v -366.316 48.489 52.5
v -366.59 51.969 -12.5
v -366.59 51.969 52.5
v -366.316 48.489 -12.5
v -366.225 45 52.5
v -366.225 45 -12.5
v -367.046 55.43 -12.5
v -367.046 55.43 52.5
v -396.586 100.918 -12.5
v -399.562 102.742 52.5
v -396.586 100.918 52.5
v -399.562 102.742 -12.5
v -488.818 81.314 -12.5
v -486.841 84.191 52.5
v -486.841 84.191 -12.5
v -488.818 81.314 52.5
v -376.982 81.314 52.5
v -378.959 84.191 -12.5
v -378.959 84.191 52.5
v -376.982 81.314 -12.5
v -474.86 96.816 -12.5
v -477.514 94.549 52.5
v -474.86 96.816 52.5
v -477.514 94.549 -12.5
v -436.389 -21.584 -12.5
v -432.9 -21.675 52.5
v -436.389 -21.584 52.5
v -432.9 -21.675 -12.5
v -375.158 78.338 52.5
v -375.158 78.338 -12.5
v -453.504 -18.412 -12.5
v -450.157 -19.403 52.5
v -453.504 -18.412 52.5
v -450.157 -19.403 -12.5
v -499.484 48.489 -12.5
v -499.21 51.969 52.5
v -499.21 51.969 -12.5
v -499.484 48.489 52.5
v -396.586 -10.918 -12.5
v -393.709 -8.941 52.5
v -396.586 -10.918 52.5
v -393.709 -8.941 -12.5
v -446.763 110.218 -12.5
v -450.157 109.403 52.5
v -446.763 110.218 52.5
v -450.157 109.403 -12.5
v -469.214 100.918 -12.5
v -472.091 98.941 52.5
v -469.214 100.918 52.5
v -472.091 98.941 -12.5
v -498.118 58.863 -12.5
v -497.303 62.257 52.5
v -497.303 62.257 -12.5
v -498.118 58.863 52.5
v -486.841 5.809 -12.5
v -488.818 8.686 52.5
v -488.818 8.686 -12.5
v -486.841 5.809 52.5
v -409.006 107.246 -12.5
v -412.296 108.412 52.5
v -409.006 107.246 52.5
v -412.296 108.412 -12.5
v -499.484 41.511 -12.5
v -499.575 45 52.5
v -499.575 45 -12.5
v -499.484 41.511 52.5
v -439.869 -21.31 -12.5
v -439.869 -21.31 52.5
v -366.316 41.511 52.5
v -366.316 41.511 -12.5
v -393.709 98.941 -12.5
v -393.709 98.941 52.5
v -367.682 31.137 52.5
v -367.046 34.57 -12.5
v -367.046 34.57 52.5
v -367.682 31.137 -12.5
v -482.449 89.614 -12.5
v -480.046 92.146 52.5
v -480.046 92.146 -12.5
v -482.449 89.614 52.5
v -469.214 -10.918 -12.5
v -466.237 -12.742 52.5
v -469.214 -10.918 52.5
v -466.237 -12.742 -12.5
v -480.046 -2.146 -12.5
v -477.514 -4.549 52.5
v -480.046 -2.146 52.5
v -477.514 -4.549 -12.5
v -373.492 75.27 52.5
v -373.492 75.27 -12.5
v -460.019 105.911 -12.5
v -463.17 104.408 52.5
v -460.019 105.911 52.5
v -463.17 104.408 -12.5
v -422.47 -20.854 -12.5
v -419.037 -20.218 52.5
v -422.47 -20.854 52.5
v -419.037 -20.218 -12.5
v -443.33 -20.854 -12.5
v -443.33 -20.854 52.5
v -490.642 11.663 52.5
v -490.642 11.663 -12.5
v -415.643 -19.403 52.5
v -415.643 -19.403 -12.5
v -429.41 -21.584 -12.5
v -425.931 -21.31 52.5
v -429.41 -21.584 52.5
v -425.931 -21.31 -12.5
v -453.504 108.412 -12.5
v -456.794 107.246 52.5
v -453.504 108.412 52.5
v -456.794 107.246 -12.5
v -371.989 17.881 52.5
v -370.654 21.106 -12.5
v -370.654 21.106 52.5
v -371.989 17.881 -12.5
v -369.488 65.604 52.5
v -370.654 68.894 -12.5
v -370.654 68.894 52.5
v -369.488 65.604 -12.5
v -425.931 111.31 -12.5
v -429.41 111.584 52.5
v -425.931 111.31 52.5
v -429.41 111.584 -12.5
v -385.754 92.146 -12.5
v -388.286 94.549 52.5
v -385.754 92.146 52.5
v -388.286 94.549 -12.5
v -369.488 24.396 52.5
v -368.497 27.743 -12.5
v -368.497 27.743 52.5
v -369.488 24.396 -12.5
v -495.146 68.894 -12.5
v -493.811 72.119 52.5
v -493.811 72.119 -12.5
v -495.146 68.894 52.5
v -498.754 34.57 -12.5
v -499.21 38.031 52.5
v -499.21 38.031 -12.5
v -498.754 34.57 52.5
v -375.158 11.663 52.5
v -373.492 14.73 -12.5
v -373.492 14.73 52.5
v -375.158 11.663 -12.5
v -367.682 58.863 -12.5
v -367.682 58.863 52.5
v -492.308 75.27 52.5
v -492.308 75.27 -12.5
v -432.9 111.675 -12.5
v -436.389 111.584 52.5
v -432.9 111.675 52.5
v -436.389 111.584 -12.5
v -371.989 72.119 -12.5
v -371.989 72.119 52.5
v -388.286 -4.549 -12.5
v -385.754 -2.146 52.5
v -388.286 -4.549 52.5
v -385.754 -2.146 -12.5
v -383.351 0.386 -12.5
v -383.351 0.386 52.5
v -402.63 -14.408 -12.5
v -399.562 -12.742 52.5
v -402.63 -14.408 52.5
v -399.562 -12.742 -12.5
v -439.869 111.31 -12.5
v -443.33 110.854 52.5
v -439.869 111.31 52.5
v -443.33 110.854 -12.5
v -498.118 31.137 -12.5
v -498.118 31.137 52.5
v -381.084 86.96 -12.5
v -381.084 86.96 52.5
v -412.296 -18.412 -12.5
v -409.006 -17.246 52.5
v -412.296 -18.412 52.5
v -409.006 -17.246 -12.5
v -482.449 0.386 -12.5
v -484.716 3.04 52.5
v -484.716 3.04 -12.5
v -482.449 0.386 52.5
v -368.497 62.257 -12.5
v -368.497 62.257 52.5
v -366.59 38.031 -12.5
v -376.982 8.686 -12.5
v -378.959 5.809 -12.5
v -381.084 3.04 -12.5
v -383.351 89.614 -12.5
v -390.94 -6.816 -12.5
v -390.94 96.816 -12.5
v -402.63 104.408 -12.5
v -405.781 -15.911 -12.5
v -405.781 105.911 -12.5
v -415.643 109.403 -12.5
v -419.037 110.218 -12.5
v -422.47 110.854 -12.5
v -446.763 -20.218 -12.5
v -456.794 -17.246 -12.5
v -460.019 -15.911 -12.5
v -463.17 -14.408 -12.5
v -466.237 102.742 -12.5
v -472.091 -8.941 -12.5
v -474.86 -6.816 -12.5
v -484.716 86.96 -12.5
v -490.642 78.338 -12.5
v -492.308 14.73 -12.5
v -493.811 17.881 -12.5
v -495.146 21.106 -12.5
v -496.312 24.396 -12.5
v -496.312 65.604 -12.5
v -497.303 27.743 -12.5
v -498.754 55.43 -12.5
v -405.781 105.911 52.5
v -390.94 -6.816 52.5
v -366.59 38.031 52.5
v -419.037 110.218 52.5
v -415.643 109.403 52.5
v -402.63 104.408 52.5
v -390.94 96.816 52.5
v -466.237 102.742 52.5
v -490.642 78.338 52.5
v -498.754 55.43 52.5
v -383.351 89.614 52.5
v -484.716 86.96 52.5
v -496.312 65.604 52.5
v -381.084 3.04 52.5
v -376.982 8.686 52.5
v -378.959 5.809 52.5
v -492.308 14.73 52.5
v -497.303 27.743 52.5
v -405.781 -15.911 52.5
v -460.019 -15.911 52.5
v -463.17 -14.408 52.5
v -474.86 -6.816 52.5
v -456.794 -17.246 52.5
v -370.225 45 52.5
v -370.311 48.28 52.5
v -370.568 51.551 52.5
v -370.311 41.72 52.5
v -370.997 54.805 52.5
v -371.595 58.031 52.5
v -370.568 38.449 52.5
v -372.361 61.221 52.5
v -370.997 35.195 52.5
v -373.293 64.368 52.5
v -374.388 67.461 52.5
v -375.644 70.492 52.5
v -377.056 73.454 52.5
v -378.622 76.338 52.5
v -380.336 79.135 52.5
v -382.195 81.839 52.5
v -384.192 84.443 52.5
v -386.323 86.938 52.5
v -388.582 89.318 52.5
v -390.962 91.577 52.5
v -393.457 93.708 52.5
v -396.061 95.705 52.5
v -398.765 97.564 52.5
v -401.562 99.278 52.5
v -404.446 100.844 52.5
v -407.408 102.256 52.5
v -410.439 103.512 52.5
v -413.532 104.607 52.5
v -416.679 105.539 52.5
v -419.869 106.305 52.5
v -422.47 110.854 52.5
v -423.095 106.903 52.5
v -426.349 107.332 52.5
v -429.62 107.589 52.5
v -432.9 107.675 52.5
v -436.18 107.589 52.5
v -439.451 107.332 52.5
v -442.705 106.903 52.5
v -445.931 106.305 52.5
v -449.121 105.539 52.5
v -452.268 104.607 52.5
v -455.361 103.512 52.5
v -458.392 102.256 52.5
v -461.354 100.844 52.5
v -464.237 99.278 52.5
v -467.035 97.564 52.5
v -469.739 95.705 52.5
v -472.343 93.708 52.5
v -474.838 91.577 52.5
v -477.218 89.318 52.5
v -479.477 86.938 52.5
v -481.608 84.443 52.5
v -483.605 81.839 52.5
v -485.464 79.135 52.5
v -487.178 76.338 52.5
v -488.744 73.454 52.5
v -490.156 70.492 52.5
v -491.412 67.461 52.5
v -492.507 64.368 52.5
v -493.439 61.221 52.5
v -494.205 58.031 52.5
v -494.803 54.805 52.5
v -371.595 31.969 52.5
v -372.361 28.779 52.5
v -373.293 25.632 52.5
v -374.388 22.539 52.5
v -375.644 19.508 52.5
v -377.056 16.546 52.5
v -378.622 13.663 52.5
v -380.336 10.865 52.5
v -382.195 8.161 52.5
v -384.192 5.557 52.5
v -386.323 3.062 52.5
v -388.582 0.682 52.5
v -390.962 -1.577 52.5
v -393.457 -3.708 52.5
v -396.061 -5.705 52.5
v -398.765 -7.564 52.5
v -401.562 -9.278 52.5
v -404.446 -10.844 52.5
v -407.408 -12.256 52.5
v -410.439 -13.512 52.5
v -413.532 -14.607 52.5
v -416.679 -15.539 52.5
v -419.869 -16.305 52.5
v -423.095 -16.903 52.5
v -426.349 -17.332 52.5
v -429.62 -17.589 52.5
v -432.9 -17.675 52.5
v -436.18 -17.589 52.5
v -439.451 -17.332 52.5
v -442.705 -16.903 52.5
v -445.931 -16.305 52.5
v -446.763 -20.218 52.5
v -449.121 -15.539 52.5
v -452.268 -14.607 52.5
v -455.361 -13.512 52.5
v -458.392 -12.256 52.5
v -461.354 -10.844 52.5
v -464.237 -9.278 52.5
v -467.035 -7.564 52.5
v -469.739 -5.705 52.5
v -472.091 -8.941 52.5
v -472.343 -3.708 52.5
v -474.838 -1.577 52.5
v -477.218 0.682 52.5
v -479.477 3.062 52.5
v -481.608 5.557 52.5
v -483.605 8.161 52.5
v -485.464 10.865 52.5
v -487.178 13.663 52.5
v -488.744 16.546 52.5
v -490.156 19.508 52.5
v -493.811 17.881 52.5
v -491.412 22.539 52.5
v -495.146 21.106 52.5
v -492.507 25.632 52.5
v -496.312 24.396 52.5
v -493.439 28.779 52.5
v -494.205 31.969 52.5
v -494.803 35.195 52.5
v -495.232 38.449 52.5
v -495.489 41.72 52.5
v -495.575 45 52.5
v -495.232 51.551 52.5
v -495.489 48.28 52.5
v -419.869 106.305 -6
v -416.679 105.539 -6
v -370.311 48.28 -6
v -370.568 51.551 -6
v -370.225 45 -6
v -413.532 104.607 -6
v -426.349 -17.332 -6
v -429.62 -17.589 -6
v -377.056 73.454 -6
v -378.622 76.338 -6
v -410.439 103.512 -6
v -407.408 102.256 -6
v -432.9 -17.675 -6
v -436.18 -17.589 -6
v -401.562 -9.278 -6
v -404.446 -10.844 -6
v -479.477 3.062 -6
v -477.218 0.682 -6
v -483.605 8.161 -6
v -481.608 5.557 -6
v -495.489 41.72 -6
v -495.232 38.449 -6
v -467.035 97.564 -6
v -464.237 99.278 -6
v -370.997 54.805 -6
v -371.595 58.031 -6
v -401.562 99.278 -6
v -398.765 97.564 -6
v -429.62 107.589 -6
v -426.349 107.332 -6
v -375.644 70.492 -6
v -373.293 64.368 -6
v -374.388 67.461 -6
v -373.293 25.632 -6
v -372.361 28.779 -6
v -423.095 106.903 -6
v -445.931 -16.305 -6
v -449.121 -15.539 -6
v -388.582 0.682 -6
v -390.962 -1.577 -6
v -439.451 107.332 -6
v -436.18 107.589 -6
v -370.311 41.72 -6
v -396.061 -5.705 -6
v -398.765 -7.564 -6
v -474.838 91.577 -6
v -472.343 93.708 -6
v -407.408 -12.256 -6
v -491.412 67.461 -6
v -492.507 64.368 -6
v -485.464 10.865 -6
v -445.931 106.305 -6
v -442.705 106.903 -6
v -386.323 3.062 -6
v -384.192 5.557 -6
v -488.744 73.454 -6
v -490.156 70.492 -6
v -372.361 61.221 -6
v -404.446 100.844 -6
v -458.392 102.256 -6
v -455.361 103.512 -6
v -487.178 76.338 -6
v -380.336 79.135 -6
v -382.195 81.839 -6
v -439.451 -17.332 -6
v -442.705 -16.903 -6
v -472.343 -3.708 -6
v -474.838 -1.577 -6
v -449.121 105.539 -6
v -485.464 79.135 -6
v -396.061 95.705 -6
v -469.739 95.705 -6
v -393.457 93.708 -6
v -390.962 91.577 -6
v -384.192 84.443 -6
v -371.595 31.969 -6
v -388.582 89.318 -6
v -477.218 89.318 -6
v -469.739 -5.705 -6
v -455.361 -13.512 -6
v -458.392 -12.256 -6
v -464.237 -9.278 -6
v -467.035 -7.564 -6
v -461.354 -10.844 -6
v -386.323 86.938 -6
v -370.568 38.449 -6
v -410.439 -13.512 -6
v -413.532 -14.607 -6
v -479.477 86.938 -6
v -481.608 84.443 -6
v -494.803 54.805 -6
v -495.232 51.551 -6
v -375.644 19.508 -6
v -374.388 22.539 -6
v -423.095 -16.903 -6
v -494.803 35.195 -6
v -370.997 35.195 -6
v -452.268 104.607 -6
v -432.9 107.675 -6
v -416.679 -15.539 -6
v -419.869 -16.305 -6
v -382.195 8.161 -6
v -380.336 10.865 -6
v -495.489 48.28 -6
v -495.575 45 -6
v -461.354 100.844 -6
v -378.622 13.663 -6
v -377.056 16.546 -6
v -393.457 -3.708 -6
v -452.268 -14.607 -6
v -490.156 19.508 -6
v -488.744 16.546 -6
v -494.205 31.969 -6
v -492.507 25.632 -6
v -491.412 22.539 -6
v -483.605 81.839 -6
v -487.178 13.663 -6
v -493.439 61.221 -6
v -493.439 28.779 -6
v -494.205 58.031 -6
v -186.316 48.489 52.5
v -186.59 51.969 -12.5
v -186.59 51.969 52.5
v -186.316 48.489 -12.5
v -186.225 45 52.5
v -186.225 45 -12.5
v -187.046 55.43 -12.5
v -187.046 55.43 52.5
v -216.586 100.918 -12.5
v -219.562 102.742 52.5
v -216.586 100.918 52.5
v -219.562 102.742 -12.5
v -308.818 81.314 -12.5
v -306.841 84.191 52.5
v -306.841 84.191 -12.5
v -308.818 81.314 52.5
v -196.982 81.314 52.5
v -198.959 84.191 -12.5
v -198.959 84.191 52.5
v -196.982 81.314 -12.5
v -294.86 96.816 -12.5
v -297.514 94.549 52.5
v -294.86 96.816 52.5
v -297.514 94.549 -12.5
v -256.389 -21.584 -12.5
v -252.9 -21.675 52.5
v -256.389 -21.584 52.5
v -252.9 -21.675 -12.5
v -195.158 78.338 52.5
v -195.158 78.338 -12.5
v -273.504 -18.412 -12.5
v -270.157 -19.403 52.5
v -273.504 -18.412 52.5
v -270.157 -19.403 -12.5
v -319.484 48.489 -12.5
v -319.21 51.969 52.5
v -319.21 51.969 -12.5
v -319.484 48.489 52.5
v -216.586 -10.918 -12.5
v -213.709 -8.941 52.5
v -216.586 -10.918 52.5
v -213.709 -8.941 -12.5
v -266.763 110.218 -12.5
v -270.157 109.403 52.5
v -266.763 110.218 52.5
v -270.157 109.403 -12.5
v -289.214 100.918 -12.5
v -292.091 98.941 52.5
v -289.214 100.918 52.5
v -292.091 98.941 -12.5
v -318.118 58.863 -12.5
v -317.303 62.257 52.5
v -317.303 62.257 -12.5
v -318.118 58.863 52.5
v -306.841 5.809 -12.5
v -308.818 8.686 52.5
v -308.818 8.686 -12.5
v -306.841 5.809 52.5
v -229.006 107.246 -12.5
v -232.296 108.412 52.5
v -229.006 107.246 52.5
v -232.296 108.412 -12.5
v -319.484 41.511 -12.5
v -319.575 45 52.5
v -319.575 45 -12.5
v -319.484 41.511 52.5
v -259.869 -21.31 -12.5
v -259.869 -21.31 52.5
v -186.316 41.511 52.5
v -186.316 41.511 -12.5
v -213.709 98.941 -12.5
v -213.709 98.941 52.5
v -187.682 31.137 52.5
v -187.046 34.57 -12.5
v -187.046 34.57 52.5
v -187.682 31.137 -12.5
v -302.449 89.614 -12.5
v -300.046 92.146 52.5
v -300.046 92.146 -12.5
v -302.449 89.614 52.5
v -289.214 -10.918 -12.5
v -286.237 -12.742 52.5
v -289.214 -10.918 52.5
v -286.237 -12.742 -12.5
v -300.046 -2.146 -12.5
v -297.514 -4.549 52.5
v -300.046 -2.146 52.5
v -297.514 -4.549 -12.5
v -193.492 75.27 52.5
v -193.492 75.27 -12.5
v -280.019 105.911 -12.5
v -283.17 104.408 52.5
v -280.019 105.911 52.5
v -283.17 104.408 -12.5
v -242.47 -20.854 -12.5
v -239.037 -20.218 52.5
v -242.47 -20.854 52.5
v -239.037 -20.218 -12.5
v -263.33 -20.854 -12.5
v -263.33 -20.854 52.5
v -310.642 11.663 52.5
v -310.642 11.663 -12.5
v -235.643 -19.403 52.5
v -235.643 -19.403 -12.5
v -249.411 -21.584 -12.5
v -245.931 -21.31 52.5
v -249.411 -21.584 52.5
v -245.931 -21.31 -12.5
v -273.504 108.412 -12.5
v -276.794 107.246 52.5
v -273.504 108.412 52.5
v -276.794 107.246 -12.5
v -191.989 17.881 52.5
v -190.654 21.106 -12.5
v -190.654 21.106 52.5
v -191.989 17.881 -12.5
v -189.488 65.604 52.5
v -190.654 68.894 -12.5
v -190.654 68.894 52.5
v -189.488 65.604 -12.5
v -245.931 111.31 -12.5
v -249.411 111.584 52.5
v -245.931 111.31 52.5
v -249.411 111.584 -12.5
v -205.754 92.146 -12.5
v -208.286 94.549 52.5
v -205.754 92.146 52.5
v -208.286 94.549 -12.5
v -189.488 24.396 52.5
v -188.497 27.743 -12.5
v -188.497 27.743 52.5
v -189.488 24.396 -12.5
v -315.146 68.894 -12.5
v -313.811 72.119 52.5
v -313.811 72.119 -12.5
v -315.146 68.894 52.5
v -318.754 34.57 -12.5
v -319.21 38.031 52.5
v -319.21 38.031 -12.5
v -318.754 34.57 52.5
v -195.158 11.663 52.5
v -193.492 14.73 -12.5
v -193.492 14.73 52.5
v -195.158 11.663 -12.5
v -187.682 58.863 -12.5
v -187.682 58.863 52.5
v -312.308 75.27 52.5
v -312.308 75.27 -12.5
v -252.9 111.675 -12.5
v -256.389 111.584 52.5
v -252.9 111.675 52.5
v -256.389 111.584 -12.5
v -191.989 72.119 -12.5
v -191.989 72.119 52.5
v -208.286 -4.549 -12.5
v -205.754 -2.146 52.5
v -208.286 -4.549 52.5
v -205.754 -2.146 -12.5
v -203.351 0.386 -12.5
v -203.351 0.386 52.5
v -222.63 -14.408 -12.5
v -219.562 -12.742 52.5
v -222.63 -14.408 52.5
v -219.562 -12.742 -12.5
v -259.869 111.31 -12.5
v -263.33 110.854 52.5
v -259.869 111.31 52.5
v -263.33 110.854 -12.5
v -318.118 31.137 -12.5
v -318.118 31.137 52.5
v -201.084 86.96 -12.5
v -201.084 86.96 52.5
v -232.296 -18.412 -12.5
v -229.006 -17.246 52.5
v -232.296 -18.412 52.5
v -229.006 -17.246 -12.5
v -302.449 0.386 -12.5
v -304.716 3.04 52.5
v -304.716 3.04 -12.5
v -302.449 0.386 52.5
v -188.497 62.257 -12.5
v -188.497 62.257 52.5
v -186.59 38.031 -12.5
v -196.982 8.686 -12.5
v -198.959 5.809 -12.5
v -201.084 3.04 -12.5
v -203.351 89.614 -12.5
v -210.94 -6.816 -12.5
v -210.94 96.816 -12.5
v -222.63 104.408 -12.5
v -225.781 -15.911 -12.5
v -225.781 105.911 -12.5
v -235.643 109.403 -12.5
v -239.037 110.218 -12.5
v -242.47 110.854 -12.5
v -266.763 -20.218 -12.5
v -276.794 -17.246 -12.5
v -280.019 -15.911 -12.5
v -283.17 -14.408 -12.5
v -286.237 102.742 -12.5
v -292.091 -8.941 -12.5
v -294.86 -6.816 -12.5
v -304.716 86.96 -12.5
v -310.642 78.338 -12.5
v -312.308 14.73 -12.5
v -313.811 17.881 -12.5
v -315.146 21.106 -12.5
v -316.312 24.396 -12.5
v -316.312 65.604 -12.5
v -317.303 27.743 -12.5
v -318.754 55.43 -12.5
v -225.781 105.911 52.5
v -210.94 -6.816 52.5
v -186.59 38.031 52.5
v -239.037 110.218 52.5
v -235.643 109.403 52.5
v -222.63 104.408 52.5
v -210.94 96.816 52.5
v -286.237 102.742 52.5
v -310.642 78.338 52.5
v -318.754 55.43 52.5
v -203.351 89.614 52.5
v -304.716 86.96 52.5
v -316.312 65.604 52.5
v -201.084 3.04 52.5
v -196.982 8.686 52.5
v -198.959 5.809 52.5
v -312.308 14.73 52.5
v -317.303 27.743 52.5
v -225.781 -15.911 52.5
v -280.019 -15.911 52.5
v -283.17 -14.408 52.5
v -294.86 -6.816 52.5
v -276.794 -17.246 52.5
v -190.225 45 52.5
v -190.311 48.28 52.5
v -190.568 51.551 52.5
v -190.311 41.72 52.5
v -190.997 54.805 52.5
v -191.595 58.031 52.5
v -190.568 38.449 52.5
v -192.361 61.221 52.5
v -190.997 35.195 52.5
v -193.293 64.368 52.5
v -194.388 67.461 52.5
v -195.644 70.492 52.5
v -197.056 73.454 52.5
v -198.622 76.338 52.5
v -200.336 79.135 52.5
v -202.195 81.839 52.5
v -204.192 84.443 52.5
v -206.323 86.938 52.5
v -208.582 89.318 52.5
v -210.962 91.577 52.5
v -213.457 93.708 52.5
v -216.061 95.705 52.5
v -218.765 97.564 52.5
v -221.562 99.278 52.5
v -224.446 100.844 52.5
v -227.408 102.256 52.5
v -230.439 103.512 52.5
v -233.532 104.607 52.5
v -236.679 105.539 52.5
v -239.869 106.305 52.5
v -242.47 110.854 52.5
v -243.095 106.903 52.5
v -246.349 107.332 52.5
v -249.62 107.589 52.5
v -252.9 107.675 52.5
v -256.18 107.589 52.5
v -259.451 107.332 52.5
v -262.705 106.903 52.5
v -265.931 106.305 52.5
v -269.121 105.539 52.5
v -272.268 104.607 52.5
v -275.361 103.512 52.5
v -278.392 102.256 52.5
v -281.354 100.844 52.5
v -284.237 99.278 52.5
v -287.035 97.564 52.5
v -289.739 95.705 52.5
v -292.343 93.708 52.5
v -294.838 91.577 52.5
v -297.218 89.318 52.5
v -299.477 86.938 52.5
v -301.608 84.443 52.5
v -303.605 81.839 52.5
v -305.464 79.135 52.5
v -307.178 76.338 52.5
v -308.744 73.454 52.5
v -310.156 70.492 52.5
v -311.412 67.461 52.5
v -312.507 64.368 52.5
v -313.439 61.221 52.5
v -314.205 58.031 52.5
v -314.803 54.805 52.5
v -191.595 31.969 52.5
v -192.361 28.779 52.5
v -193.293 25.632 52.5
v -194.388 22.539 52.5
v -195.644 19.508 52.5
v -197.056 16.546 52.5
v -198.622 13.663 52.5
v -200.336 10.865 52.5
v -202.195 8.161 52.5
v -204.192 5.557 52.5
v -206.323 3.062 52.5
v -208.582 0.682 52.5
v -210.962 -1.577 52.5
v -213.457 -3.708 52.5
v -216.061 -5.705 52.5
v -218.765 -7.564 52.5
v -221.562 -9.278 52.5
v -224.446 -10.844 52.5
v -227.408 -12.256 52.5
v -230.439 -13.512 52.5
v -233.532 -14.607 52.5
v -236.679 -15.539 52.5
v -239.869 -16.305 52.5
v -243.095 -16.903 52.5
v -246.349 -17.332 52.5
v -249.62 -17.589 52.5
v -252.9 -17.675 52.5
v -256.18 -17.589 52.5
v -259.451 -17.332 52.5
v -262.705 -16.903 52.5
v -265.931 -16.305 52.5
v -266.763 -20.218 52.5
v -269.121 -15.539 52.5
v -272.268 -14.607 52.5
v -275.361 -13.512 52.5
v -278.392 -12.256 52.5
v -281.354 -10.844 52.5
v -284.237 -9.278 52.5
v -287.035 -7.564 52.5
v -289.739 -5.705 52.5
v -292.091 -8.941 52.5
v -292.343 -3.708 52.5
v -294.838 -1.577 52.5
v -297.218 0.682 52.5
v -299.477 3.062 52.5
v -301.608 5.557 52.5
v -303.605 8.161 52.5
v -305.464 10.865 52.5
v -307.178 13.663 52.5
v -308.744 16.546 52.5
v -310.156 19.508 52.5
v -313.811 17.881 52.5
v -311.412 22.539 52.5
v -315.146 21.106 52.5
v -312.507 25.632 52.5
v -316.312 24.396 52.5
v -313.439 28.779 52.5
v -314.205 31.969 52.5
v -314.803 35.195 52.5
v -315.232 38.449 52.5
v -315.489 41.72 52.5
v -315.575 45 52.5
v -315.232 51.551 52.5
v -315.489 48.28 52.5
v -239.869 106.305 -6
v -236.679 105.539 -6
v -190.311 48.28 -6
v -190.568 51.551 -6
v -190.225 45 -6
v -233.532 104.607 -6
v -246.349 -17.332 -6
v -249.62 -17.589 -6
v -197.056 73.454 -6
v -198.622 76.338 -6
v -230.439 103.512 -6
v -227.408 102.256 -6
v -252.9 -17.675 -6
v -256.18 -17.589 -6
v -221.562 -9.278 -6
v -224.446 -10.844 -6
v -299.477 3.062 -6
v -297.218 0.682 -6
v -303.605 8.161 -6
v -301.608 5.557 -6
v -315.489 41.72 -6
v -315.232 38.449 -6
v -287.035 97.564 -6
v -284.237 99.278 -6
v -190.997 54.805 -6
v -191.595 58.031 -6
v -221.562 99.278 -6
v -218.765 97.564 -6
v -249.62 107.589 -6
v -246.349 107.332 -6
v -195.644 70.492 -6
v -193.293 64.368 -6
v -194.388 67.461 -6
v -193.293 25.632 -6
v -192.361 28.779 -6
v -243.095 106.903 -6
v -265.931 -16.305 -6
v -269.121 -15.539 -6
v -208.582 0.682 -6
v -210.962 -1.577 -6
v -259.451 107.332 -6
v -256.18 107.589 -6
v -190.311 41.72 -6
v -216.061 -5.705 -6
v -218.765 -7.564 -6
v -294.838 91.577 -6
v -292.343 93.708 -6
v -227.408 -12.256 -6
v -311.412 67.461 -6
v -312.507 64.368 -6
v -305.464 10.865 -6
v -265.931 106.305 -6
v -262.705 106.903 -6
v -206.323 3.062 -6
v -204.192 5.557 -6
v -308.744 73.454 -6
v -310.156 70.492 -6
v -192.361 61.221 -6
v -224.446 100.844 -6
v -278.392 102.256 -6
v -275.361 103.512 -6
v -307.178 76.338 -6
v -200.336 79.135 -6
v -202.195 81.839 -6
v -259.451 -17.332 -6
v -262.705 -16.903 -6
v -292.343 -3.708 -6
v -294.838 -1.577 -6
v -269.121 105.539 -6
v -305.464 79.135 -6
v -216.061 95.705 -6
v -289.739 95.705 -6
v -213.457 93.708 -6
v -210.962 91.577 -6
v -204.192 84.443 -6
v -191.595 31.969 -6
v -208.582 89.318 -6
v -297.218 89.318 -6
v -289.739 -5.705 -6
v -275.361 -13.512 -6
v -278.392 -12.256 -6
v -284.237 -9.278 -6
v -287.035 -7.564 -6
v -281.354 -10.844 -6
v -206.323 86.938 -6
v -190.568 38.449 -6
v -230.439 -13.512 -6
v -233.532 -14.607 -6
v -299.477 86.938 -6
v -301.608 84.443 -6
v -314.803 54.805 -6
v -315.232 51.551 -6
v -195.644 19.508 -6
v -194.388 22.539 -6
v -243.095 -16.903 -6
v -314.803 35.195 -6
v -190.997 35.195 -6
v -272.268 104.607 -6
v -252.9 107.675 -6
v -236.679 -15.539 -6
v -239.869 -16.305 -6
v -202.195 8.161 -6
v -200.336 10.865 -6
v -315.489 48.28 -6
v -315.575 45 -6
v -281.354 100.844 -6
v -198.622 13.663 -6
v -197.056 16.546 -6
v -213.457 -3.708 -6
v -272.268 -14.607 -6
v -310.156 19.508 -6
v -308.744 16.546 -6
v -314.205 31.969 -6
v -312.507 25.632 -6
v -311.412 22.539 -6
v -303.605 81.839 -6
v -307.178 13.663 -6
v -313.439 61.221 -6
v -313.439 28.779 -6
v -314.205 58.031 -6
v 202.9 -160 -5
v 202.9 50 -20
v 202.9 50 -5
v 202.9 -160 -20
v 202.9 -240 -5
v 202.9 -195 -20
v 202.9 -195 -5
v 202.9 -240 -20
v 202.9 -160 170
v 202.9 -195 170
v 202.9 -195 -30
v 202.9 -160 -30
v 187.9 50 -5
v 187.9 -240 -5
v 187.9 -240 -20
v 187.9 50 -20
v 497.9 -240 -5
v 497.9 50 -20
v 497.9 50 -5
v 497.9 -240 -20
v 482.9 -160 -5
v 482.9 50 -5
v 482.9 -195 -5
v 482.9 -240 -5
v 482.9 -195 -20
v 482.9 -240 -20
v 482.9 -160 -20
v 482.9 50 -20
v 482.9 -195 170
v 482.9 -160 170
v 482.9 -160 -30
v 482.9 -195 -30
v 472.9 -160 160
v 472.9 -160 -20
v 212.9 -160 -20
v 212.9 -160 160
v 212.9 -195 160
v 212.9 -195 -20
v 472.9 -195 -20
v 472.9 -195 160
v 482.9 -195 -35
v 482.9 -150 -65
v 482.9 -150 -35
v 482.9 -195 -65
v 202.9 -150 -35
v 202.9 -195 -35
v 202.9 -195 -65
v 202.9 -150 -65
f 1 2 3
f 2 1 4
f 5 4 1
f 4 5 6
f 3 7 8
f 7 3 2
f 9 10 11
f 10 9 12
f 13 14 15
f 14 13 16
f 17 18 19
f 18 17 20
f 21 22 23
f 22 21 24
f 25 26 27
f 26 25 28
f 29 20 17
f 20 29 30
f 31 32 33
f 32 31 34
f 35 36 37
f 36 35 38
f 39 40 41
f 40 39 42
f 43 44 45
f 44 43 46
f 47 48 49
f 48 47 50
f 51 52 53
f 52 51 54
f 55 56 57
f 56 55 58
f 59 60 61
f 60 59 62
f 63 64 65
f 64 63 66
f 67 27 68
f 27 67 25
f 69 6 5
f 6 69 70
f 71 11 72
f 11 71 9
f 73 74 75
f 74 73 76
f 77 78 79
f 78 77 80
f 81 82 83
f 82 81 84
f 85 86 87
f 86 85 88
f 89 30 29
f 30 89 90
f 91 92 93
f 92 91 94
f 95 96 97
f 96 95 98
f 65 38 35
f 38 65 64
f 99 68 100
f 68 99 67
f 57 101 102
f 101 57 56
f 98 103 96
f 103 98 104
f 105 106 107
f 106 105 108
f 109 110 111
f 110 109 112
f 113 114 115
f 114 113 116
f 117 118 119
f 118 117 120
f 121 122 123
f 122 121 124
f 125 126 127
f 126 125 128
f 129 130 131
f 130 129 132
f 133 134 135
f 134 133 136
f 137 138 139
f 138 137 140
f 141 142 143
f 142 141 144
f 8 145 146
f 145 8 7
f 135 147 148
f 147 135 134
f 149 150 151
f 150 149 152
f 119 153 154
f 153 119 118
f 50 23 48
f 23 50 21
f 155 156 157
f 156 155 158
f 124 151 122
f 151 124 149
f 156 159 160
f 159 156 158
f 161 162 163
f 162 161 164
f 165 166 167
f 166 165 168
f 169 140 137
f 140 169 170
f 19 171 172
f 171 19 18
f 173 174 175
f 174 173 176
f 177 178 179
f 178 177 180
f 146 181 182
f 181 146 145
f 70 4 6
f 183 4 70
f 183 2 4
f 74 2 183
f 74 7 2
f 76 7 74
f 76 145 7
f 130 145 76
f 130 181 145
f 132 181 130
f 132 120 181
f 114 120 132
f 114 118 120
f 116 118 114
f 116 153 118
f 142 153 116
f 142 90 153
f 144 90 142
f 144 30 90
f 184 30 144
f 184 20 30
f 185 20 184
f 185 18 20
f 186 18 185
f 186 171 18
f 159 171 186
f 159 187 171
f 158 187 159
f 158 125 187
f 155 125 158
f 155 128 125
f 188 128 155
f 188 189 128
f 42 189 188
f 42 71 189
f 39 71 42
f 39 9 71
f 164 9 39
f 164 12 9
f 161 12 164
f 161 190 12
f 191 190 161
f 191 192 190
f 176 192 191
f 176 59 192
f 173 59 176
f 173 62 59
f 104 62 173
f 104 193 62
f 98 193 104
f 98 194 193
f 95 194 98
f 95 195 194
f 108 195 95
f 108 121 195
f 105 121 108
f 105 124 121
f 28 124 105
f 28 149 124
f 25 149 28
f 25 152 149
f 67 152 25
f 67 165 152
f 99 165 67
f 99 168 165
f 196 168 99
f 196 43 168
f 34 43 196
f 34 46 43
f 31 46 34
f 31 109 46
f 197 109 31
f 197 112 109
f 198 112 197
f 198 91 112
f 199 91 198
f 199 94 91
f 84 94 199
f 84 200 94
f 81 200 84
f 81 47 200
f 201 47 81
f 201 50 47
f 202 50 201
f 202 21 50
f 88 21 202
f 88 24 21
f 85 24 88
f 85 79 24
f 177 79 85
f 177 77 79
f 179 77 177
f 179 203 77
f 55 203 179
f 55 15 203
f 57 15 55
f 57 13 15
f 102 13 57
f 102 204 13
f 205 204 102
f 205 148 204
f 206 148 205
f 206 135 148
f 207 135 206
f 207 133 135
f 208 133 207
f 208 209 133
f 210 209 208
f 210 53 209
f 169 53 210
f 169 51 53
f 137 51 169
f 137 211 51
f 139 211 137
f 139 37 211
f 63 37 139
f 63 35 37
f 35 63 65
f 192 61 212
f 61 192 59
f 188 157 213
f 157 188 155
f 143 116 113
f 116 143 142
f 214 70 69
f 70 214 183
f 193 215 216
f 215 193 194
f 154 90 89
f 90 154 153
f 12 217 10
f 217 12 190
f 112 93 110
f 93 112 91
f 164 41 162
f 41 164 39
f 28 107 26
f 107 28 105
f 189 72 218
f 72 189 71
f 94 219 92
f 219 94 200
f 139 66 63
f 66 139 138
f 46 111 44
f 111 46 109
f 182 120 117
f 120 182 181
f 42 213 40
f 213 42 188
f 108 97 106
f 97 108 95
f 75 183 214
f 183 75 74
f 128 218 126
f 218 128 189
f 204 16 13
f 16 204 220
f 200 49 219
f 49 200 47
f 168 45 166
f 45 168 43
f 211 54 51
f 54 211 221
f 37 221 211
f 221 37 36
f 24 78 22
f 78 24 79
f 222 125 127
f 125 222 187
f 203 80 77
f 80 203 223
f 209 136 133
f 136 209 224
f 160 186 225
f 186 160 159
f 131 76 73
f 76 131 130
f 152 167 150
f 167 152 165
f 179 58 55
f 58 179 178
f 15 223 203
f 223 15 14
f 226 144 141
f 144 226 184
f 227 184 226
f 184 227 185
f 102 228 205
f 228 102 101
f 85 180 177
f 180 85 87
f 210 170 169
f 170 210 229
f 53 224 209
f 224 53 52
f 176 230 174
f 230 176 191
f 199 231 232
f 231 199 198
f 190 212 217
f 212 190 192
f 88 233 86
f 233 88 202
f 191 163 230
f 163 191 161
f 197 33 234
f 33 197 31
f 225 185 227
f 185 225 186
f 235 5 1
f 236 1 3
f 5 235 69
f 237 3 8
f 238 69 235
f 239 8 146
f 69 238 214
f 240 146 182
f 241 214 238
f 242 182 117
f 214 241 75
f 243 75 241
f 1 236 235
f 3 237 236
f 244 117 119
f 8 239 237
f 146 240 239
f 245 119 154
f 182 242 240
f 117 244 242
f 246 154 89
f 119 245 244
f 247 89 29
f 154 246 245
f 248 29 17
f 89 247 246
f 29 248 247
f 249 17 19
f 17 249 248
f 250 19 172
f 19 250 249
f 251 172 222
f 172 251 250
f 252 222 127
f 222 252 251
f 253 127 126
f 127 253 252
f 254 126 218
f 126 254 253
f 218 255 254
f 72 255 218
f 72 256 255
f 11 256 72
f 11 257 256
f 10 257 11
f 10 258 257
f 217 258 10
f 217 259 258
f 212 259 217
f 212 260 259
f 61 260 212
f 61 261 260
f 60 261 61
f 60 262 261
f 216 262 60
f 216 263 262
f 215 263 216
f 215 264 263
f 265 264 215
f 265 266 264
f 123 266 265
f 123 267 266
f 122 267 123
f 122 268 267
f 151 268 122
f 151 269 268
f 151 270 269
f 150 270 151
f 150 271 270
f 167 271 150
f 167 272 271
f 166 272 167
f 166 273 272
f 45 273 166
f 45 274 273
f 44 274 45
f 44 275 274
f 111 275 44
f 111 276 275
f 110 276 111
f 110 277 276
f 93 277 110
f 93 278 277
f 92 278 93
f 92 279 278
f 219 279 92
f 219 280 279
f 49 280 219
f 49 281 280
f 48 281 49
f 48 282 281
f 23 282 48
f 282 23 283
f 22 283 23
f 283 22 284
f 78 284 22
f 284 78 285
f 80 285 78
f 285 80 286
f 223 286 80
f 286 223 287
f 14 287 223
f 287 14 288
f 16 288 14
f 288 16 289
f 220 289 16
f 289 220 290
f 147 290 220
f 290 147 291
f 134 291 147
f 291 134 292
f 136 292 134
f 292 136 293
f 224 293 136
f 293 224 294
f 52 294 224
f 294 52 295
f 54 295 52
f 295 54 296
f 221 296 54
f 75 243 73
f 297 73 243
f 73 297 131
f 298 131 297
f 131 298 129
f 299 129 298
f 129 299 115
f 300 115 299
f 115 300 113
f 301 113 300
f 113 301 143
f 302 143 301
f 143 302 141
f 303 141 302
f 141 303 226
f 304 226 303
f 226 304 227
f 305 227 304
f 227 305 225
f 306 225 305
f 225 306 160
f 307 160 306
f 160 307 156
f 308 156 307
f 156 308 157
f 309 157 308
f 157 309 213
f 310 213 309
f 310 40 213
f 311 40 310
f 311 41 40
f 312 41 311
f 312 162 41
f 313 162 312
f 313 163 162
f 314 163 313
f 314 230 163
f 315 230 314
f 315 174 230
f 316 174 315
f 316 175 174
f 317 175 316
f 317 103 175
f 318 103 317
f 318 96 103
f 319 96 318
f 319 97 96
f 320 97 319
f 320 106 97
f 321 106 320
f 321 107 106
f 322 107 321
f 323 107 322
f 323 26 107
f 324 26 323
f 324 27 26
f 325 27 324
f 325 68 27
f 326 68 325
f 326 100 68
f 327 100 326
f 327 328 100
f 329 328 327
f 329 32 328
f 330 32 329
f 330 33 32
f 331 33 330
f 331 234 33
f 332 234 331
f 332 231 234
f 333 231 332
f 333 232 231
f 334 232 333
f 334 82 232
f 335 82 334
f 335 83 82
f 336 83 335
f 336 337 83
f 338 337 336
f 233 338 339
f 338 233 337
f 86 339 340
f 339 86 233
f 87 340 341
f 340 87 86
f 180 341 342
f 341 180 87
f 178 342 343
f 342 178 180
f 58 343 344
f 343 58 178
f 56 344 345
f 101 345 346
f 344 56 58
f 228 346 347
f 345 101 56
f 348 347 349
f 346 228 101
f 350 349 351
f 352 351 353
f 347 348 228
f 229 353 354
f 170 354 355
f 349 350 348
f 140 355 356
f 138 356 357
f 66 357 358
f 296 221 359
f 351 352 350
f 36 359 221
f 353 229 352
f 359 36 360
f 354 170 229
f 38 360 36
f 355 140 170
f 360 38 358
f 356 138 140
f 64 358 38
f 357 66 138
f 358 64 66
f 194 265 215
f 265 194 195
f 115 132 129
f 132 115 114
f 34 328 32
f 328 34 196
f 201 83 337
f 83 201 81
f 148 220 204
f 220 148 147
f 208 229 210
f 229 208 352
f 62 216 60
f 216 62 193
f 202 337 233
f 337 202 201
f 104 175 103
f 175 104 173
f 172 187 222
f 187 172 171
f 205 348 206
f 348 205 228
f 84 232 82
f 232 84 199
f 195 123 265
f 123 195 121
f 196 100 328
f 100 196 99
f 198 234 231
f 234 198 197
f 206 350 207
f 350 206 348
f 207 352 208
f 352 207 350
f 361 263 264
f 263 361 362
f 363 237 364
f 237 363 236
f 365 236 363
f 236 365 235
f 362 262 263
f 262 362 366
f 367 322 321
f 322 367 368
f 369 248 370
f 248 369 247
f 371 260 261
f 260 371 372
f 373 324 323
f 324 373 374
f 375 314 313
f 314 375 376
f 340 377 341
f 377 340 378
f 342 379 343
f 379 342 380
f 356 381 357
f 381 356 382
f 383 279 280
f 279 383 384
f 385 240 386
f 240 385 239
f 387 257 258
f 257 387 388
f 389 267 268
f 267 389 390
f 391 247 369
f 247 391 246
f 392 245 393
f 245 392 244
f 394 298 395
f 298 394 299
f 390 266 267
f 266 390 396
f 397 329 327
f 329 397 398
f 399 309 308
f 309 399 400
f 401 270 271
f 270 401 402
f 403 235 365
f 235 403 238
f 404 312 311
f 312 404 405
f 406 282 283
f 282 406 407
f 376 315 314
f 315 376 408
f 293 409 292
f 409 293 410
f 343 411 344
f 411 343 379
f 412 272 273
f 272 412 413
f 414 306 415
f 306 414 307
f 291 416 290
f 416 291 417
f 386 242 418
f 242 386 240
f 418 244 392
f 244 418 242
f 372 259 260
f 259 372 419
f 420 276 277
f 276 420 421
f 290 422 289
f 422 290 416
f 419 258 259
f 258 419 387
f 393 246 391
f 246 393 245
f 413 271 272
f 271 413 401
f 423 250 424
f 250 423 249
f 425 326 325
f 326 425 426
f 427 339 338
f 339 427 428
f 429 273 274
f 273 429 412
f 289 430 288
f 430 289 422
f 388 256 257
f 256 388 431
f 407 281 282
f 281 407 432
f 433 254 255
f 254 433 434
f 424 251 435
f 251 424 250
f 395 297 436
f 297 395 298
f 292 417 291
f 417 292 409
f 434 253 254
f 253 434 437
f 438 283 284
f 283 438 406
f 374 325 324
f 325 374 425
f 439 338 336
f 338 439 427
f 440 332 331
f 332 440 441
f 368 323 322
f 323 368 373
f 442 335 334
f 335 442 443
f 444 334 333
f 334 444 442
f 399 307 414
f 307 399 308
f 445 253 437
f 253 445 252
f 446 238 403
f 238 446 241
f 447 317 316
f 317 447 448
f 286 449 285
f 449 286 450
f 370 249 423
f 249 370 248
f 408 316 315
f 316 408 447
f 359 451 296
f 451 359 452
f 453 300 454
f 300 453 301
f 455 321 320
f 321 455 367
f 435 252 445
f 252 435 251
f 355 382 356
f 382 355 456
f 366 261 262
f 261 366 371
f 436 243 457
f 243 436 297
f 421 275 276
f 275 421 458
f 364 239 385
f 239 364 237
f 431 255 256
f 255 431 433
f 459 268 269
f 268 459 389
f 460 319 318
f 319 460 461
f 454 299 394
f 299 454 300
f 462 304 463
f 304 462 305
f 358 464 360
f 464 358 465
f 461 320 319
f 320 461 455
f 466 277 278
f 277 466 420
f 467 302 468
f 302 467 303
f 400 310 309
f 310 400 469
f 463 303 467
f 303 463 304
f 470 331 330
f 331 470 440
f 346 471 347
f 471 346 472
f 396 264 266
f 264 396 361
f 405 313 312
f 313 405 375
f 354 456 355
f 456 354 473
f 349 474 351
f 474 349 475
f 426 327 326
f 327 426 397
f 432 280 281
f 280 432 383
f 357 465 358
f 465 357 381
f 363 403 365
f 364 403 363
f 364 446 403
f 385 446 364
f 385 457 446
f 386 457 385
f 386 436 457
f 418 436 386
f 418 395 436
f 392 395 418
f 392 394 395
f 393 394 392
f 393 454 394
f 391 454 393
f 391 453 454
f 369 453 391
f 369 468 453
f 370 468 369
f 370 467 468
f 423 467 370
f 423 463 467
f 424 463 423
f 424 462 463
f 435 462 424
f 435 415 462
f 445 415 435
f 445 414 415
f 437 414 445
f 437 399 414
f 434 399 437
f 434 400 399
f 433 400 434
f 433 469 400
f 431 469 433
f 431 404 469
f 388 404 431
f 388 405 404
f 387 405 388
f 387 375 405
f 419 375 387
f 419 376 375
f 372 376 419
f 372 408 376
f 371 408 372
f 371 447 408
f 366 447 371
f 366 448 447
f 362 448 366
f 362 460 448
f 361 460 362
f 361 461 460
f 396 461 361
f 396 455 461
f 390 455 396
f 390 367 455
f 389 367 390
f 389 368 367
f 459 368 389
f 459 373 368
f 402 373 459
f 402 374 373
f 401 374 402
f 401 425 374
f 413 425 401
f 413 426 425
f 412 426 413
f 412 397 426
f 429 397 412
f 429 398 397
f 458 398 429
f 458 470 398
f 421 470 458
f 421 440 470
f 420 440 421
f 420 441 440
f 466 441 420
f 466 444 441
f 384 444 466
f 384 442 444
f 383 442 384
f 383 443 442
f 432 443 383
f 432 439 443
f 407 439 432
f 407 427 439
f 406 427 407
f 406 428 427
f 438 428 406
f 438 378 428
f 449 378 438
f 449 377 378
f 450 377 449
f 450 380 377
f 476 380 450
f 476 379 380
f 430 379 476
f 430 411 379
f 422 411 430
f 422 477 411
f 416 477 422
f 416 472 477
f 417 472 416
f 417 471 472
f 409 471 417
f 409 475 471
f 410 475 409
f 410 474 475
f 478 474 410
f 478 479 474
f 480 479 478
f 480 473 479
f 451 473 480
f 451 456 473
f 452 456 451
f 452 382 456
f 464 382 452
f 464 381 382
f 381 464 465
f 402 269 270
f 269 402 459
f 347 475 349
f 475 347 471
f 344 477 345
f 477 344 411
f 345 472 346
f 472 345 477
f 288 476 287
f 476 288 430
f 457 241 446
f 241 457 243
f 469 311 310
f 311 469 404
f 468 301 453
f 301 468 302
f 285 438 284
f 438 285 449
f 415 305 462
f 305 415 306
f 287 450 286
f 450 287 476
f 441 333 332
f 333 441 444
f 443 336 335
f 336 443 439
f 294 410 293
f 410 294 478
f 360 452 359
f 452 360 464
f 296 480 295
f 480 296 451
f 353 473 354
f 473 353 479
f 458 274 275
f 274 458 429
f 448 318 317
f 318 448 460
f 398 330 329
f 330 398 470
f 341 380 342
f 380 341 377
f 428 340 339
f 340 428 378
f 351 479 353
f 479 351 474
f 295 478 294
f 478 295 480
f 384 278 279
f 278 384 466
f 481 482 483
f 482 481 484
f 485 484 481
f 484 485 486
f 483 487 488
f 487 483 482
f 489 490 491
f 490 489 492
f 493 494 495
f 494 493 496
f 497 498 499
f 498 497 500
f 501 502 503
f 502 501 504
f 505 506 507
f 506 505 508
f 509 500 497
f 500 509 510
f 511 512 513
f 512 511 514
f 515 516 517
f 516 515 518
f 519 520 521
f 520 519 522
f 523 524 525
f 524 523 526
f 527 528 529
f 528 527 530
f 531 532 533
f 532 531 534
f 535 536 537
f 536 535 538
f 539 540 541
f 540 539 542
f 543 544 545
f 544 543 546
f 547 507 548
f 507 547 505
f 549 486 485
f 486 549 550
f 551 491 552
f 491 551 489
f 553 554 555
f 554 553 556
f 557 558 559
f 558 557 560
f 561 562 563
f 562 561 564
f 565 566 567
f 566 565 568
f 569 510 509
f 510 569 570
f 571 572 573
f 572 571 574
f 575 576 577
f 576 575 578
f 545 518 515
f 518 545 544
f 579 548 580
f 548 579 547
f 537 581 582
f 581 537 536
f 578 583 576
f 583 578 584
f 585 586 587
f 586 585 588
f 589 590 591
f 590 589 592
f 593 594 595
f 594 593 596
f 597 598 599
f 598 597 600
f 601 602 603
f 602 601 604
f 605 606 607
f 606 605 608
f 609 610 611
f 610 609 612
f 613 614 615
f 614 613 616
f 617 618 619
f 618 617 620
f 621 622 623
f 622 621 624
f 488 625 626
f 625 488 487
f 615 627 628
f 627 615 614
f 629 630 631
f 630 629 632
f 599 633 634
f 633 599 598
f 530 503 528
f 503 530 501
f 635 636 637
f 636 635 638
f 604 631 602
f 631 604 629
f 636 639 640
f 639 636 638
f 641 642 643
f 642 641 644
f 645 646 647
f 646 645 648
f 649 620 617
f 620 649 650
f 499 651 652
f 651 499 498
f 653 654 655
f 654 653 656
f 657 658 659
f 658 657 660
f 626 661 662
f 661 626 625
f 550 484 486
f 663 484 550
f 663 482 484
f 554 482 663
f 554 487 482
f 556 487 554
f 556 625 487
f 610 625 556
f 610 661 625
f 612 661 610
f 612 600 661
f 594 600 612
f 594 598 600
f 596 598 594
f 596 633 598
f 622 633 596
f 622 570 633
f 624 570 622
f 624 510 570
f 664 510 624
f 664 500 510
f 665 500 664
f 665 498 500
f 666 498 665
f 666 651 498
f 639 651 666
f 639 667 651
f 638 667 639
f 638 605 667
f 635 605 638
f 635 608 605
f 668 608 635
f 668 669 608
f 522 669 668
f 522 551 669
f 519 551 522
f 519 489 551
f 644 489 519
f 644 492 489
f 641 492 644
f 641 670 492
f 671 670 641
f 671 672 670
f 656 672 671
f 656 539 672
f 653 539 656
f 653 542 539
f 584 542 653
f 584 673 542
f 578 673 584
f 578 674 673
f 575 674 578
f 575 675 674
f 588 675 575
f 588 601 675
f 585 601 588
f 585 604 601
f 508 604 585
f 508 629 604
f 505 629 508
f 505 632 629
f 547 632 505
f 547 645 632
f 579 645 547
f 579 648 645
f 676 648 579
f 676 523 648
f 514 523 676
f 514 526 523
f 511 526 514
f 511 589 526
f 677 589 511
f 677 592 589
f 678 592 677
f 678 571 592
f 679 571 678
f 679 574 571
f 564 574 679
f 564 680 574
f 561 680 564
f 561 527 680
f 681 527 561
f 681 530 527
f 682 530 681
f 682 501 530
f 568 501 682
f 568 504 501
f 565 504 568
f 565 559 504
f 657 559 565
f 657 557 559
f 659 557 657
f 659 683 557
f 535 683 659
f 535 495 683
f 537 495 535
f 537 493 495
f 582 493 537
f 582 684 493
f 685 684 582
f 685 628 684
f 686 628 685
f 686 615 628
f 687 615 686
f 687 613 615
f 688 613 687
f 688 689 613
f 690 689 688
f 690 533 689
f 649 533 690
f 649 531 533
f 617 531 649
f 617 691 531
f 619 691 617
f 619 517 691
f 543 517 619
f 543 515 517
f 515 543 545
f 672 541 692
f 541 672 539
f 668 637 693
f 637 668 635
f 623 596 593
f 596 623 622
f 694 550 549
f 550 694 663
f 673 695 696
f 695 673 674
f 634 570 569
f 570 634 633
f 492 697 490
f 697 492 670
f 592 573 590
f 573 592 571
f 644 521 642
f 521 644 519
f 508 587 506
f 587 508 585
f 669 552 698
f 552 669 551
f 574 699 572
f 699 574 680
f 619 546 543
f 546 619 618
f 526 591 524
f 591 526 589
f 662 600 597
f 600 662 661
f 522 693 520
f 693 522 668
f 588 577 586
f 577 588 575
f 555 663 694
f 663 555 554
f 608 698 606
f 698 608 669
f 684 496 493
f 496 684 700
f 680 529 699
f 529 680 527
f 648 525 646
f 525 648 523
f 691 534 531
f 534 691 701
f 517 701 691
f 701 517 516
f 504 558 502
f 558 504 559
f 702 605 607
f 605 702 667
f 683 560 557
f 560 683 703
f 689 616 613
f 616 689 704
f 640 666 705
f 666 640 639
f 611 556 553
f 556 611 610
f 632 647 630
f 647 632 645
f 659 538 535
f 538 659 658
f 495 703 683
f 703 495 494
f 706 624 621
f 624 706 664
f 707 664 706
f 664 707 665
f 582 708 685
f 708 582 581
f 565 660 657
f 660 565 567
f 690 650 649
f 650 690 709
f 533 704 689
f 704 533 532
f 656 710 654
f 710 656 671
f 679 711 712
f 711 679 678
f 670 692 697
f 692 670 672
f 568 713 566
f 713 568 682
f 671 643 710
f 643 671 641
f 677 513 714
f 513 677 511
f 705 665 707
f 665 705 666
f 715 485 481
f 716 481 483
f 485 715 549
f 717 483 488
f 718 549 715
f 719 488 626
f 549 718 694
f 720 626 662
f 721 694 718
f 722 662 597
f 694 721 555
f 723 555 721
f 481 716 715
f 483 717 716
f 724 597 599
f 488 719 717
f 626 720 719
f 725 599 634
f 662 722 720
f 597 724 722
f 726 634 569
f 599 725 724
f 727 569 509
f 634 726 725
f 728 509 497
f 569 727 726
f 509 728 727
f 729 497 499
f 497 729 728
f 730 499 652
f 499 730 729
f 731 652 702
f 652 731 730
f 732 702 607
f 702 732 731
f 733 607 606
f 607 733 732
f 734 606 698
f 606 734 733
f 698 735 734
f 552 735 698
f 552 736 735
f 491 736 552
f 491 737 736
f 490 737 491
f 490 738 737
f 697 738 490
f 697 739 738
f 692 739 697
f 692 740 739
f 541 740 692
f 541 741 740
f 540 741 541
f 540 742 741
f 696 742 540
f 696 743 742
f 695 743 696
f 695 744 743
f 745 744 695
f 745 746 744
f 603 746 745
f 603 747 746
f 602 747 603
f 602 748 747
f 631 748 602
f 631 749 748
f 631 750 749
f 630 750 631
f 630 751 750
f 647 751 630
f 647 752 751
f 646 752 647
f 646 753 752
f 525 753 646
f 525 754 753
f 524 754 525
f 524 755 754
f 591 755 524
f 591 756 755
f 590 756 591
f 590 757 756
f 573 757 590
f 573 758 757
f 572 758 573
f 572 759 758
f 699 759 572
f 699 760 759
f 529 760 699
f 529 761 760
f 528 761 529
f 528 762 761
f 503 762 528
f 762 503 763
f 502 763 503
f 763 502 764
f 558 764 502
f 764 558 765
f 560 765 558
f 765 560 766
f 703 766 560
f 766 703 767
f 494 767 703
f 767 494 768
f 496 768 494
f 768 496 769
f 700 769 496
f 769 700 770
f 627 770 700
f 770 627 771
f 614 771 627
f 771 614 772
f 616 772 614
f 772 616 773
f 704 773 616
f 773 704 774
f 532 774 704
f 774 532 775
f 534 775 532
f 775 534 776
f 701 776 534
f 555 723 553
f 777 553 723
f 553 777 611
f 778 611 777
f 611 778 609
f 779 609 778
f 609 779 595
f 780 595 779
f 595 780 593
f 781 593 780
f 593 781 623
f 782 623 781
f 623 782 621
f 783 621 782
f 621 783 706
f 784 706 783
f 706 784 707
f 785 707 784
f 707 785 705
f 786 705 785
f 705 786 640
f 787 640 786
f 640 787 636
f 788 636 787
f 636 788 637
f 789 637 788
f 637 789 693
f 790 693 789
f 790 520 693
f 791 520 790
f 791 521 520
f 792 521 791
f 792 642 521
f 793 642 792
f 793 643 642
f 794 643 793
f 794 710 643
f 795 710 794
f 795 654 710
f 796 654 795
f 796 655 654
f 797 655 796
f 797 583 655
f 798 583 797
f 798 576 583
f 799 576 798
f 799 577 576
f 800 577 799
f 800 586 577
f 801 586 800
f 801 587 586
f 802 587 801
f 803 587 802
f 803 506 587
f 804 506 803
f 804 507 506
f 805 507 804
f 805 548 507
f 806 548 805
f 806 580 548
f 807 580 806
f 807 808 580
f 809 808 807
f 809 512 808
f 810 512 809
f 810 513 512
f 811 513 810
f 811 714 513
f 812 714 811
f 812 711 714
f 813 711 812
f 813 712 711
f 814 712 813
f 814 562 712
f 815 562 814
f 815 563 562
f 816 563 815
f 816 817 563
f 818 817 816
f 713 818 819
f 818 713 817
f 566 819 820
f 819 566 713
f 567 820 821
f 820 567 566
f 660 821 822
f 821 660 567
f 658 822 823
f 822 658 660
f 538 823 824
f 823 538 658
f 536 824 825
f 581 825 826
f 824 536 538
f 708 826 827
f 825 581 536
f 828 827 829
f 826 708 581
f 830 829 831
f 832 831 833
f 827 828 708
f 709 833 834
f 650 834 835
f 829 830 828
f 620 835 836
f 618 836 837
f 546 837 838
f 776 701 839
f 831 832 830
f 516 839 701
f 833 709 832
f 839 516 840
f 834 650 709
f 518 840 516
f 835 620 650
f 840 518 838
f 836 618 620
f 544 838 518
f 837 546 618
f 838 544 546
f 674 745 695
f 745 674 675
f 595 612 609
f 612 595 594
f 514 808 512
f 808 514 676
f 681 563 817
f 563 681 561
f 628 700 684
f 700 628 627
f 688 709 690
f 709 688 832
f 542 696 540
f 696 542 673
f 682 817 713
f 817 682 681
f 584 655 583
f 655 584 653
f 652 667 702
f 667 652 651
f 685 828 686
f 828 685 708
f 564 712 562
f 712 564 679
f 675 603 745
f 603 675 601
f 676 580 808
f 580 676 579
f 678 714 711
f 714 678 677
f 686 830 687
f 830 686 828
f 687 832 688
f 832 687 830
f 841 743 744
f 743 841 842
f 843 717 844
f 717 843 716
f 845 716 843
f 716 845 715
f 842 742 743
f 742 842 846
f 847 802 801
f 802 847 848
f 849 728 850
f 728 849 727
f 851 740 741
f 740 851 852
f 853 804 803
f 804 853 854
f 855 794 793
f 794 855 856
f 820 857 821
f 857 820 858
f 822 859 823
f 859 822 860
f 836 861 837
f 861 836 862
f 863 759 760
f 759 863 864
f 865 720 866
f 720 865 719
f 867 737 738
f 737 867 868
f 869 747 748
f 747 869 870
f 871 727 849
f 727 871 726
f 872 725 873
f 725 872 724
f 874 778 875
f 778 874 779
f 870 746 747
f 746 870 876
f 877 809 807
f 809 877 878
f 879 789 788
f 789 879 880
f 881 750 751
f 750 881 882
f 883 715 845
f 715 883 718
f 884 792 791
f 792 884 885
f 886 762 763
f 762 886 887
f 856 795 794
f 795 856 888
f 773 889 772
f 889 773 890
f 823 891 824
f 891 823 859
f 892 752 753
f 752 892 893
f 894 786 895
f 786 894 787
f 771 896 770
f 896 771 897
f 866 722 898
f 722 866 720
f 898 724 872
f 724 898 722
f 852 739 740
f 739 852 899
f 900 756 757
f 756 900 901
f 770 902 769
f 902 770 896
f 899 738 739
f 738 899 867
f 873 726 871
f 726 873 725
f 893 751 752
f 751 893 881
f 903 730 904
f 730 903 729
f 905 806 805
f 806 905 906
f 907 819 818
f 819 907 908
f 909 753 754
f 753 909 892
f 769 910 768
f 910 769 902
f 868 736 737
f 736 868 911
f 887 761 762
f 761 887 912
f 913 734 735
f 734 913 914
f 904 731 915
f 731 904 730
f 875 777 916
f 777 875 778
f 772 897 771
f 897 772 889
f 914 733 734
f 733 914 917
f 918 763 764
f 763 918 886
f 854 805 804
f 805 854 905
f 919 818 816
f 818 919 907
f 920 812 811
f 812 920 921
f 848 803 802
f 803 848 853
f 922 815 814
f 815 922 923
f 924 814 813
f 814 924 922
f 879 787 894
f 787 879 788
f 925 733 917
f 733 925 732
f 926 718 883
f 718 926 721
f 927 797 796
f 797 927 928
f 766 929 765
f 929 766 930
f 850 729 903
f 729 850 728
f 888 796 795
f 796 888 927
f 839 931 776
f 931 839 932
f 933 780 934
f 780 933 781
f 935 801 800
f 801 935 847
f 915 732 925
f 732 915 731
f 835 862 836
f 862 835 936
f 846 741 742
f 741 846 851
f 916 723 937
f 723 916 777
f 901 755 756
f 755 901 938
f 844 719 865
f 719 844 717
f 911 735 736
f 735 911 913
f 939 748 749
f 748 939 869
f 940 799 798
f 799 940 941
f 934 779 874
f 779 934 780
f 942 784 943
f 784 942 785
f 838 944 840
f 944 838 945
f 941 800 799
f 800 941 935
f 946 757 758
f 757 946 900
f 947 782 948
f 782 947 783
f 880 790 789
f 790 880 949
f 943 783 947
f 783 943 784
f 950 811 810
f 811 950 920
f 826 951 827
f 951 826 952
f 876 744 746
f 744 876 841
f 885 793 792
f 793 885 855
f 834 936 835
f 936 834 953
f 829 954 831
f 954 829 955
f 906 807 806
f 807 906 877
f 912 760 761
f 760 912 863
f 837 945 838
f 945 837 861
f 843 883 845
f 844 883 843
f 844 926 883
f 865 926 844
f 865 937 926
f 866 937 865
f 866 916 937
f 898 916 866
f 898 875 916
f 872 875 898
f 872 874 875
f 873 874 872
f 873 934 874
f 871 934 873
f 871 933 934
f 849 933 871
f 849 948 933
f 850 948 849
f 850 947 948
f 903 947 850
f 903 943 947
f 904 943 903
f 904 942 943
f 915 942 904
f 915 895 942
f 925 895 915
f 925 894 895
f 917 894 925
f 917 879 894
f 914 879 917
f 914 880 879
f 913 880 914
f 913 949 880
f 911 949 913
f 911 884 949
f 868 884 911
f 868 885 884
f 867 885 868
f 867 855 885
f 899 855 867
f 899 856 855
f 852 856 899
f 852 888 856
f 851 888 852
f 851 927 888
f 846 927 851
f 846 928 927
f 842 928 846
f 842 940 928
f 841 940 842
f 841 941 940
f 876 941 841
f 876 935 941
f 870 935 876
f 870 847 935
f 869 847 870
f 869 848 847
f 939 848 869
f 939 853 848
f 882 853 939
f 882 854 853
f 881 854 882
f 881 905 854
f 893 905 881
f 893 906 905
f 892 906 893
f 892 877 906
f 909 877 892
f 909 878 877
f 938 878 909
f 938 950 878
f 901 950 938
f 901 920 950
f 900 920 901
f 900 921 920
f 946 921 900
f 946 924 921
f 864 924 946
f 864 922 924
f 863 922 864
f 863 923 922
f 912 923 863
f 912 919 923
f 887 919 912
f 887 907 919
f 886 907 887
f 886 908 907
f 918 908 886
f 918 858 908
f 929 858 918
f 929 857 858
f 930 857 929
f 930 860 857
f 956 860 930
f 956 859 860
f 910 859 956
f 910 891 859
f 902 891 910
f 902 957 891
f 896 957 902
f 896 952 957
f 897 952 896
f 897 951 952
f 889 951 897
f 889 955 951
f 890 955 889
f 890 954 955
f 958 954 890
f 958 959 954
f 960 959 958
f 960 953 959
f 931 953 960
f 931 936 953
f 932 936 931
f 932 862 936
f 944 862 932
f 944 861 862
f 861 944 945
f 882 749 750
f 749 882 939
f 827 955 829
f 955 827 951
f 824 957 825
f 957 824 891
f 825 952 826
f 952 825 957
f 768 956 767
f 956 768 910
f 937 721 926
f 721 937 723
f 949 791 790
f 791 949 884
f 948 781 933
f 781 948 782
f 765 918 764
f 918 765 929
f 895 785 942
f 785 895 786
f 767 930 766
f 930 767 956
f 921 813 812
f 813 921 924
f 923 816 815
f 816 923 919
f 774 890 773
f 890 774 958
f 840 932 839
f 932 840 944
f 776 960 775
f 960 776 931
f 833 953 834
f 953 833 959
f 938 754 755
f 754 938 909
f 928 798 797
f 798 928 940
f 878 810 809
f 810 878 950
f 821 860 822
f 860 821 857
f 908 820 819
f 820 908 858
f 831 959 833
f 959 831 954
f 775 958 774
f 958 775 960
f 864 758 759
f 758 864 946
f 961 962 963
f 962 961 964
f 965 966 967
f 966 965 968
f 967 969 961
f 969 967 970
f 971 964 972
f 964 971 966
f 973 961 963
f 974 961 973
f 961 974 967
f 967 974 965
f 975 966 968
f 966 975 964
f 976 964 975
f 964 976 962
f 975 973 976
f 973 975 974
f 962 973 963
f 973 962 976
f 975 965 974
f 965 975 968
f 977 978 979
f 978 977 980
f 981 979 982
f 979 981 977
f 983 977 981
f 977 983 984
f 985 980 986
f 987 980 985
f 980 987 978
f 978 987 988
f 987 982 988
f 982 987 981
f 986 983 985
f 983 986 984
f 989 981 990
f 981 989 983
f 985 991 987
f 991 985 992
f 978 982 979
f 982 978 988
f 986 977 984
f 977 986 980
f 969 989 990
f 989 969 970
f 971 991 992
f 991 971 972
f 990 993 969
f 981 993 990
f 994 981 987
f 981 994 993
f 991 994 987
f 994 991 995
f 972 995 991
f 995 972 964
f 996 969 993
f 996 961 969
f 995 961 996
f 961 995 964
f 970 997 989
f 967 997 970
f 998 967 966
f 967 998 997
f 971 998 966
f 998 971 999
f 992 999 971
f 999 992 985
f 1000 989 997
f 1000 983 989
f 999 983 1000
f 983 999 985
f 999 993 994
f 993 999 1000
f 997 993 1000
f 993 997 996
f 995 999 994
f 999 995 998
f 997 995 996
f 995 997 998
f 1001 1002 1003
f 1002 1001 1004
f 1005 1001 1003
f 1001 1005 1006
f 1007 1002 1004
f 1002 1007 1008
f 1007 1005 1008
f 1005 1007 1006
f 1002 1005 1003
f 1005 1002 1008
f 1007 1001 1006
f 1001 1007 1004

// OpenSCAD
// ====================================================================================
// REVOLUTIONARY TECHNOLOGY COMPANY & UNIVERSITY OF WASHINGTON DEPARTMENT OF PHYSICS
// Subsystem: silverado_md_dash_components.scad (Motorized Fleet Control Displays)
// Core Application: Deploys Driver Instrument Cluster & Co-Pilot Upfit Console
// Center Origin (0,0,0) = Firewall Center point along Steering Axis
// ====================================================================================

$fn = 120; // High-precision CNC milling and dashboard molding resolution

// --- Parametric Geometric Boundaries (mm) ---
inch_to_mm         = 25.4;
standard_dash_w    = 54.0 * inch_to_mm; // 1371.6 mm interior cabin cross-width [INDEX]
driver_pod_dia     = 133.35;            // Authentic dual-pod pod diameter [INDEX]
copilot_panel_w    = 280.00;            // Extended 11-inch heavy upfit command display

// Motorized Drawer Track Slide Offset (0 = Retracted inside glovebox, 240 = Deployed)
GLOVEBOX_DEPLOY_MM = 240.00; 

module driver_analog_led_pods() {
    echo("COMPILING SILVERADO MD DRIVER ANALOG-LED DUAL POD HOUSINGS");
    // Left and Right circular pods tracking speed and Mega-Flux stator RPM [INDEX]
    color("DarkCharcoal") {
        for (offset = [-90, 90]) {
            translate([-standard_dash_w/4 + offset, 45, 20]) {
                difference() {
                    cylinder(d=driver_pod_dia, h=65, center=true);
                    translate([0, 0, 4])
                        cylinder(d=driver_pod_dia - 8, h=60, center=true); // Internal viewport hollow
                }
            }
        }
    }
}

module motorized_copilot_upfit_console() {
    echo("COMPILING EXTENSIVE CO-PILOT INDUSTRIAL UPFIT COMMAND WORKSTATION");
    // Heavy dual linear roller tracks sliding straight out from the passenger glovebox frame
    translate([standard_dash_w/4 - copilot_panel_w/2, 45 - GLOVEBOX_DEPLOY_MM, -30]) {
        color("Silver") {
            translate([-15, -45, 10]) cube([15, GLOVEBOX_DEPLOY_MM + 50, 15]);
            translate([copilot_panel_w, -45, 10]) cube([15, GLOVEBOX_DEPLOY_MM + 50, 15]);
        }
        
        // Co-Pilot Multi-Mux Command Interface Frame
        color("DimGrey") {
            difference() {
                // Main monitor structural housing cube
                cube([copilot_panel_w, 35, 200]);
                // Viewport display window cutout face
                translate([10, -1, 10])
                    cube([copilot_panel_w - 20, 38, 180]);
            }
        }
        
        // Lower Dedicated Hardware Button Bar
        // Replicates 1969 tactile toggle switches to actuate heavy hydraulics/winches natively
        color("Black") {
            translate([0, 0, -35])
                cube([copilot_panel_w, 45, 30]);
        }
    }
}

// --- Composite Display Matrix Instantiation ---
union() {
    driver_analog_led_pods();
    motorized_copilot_upfit_console();
}
